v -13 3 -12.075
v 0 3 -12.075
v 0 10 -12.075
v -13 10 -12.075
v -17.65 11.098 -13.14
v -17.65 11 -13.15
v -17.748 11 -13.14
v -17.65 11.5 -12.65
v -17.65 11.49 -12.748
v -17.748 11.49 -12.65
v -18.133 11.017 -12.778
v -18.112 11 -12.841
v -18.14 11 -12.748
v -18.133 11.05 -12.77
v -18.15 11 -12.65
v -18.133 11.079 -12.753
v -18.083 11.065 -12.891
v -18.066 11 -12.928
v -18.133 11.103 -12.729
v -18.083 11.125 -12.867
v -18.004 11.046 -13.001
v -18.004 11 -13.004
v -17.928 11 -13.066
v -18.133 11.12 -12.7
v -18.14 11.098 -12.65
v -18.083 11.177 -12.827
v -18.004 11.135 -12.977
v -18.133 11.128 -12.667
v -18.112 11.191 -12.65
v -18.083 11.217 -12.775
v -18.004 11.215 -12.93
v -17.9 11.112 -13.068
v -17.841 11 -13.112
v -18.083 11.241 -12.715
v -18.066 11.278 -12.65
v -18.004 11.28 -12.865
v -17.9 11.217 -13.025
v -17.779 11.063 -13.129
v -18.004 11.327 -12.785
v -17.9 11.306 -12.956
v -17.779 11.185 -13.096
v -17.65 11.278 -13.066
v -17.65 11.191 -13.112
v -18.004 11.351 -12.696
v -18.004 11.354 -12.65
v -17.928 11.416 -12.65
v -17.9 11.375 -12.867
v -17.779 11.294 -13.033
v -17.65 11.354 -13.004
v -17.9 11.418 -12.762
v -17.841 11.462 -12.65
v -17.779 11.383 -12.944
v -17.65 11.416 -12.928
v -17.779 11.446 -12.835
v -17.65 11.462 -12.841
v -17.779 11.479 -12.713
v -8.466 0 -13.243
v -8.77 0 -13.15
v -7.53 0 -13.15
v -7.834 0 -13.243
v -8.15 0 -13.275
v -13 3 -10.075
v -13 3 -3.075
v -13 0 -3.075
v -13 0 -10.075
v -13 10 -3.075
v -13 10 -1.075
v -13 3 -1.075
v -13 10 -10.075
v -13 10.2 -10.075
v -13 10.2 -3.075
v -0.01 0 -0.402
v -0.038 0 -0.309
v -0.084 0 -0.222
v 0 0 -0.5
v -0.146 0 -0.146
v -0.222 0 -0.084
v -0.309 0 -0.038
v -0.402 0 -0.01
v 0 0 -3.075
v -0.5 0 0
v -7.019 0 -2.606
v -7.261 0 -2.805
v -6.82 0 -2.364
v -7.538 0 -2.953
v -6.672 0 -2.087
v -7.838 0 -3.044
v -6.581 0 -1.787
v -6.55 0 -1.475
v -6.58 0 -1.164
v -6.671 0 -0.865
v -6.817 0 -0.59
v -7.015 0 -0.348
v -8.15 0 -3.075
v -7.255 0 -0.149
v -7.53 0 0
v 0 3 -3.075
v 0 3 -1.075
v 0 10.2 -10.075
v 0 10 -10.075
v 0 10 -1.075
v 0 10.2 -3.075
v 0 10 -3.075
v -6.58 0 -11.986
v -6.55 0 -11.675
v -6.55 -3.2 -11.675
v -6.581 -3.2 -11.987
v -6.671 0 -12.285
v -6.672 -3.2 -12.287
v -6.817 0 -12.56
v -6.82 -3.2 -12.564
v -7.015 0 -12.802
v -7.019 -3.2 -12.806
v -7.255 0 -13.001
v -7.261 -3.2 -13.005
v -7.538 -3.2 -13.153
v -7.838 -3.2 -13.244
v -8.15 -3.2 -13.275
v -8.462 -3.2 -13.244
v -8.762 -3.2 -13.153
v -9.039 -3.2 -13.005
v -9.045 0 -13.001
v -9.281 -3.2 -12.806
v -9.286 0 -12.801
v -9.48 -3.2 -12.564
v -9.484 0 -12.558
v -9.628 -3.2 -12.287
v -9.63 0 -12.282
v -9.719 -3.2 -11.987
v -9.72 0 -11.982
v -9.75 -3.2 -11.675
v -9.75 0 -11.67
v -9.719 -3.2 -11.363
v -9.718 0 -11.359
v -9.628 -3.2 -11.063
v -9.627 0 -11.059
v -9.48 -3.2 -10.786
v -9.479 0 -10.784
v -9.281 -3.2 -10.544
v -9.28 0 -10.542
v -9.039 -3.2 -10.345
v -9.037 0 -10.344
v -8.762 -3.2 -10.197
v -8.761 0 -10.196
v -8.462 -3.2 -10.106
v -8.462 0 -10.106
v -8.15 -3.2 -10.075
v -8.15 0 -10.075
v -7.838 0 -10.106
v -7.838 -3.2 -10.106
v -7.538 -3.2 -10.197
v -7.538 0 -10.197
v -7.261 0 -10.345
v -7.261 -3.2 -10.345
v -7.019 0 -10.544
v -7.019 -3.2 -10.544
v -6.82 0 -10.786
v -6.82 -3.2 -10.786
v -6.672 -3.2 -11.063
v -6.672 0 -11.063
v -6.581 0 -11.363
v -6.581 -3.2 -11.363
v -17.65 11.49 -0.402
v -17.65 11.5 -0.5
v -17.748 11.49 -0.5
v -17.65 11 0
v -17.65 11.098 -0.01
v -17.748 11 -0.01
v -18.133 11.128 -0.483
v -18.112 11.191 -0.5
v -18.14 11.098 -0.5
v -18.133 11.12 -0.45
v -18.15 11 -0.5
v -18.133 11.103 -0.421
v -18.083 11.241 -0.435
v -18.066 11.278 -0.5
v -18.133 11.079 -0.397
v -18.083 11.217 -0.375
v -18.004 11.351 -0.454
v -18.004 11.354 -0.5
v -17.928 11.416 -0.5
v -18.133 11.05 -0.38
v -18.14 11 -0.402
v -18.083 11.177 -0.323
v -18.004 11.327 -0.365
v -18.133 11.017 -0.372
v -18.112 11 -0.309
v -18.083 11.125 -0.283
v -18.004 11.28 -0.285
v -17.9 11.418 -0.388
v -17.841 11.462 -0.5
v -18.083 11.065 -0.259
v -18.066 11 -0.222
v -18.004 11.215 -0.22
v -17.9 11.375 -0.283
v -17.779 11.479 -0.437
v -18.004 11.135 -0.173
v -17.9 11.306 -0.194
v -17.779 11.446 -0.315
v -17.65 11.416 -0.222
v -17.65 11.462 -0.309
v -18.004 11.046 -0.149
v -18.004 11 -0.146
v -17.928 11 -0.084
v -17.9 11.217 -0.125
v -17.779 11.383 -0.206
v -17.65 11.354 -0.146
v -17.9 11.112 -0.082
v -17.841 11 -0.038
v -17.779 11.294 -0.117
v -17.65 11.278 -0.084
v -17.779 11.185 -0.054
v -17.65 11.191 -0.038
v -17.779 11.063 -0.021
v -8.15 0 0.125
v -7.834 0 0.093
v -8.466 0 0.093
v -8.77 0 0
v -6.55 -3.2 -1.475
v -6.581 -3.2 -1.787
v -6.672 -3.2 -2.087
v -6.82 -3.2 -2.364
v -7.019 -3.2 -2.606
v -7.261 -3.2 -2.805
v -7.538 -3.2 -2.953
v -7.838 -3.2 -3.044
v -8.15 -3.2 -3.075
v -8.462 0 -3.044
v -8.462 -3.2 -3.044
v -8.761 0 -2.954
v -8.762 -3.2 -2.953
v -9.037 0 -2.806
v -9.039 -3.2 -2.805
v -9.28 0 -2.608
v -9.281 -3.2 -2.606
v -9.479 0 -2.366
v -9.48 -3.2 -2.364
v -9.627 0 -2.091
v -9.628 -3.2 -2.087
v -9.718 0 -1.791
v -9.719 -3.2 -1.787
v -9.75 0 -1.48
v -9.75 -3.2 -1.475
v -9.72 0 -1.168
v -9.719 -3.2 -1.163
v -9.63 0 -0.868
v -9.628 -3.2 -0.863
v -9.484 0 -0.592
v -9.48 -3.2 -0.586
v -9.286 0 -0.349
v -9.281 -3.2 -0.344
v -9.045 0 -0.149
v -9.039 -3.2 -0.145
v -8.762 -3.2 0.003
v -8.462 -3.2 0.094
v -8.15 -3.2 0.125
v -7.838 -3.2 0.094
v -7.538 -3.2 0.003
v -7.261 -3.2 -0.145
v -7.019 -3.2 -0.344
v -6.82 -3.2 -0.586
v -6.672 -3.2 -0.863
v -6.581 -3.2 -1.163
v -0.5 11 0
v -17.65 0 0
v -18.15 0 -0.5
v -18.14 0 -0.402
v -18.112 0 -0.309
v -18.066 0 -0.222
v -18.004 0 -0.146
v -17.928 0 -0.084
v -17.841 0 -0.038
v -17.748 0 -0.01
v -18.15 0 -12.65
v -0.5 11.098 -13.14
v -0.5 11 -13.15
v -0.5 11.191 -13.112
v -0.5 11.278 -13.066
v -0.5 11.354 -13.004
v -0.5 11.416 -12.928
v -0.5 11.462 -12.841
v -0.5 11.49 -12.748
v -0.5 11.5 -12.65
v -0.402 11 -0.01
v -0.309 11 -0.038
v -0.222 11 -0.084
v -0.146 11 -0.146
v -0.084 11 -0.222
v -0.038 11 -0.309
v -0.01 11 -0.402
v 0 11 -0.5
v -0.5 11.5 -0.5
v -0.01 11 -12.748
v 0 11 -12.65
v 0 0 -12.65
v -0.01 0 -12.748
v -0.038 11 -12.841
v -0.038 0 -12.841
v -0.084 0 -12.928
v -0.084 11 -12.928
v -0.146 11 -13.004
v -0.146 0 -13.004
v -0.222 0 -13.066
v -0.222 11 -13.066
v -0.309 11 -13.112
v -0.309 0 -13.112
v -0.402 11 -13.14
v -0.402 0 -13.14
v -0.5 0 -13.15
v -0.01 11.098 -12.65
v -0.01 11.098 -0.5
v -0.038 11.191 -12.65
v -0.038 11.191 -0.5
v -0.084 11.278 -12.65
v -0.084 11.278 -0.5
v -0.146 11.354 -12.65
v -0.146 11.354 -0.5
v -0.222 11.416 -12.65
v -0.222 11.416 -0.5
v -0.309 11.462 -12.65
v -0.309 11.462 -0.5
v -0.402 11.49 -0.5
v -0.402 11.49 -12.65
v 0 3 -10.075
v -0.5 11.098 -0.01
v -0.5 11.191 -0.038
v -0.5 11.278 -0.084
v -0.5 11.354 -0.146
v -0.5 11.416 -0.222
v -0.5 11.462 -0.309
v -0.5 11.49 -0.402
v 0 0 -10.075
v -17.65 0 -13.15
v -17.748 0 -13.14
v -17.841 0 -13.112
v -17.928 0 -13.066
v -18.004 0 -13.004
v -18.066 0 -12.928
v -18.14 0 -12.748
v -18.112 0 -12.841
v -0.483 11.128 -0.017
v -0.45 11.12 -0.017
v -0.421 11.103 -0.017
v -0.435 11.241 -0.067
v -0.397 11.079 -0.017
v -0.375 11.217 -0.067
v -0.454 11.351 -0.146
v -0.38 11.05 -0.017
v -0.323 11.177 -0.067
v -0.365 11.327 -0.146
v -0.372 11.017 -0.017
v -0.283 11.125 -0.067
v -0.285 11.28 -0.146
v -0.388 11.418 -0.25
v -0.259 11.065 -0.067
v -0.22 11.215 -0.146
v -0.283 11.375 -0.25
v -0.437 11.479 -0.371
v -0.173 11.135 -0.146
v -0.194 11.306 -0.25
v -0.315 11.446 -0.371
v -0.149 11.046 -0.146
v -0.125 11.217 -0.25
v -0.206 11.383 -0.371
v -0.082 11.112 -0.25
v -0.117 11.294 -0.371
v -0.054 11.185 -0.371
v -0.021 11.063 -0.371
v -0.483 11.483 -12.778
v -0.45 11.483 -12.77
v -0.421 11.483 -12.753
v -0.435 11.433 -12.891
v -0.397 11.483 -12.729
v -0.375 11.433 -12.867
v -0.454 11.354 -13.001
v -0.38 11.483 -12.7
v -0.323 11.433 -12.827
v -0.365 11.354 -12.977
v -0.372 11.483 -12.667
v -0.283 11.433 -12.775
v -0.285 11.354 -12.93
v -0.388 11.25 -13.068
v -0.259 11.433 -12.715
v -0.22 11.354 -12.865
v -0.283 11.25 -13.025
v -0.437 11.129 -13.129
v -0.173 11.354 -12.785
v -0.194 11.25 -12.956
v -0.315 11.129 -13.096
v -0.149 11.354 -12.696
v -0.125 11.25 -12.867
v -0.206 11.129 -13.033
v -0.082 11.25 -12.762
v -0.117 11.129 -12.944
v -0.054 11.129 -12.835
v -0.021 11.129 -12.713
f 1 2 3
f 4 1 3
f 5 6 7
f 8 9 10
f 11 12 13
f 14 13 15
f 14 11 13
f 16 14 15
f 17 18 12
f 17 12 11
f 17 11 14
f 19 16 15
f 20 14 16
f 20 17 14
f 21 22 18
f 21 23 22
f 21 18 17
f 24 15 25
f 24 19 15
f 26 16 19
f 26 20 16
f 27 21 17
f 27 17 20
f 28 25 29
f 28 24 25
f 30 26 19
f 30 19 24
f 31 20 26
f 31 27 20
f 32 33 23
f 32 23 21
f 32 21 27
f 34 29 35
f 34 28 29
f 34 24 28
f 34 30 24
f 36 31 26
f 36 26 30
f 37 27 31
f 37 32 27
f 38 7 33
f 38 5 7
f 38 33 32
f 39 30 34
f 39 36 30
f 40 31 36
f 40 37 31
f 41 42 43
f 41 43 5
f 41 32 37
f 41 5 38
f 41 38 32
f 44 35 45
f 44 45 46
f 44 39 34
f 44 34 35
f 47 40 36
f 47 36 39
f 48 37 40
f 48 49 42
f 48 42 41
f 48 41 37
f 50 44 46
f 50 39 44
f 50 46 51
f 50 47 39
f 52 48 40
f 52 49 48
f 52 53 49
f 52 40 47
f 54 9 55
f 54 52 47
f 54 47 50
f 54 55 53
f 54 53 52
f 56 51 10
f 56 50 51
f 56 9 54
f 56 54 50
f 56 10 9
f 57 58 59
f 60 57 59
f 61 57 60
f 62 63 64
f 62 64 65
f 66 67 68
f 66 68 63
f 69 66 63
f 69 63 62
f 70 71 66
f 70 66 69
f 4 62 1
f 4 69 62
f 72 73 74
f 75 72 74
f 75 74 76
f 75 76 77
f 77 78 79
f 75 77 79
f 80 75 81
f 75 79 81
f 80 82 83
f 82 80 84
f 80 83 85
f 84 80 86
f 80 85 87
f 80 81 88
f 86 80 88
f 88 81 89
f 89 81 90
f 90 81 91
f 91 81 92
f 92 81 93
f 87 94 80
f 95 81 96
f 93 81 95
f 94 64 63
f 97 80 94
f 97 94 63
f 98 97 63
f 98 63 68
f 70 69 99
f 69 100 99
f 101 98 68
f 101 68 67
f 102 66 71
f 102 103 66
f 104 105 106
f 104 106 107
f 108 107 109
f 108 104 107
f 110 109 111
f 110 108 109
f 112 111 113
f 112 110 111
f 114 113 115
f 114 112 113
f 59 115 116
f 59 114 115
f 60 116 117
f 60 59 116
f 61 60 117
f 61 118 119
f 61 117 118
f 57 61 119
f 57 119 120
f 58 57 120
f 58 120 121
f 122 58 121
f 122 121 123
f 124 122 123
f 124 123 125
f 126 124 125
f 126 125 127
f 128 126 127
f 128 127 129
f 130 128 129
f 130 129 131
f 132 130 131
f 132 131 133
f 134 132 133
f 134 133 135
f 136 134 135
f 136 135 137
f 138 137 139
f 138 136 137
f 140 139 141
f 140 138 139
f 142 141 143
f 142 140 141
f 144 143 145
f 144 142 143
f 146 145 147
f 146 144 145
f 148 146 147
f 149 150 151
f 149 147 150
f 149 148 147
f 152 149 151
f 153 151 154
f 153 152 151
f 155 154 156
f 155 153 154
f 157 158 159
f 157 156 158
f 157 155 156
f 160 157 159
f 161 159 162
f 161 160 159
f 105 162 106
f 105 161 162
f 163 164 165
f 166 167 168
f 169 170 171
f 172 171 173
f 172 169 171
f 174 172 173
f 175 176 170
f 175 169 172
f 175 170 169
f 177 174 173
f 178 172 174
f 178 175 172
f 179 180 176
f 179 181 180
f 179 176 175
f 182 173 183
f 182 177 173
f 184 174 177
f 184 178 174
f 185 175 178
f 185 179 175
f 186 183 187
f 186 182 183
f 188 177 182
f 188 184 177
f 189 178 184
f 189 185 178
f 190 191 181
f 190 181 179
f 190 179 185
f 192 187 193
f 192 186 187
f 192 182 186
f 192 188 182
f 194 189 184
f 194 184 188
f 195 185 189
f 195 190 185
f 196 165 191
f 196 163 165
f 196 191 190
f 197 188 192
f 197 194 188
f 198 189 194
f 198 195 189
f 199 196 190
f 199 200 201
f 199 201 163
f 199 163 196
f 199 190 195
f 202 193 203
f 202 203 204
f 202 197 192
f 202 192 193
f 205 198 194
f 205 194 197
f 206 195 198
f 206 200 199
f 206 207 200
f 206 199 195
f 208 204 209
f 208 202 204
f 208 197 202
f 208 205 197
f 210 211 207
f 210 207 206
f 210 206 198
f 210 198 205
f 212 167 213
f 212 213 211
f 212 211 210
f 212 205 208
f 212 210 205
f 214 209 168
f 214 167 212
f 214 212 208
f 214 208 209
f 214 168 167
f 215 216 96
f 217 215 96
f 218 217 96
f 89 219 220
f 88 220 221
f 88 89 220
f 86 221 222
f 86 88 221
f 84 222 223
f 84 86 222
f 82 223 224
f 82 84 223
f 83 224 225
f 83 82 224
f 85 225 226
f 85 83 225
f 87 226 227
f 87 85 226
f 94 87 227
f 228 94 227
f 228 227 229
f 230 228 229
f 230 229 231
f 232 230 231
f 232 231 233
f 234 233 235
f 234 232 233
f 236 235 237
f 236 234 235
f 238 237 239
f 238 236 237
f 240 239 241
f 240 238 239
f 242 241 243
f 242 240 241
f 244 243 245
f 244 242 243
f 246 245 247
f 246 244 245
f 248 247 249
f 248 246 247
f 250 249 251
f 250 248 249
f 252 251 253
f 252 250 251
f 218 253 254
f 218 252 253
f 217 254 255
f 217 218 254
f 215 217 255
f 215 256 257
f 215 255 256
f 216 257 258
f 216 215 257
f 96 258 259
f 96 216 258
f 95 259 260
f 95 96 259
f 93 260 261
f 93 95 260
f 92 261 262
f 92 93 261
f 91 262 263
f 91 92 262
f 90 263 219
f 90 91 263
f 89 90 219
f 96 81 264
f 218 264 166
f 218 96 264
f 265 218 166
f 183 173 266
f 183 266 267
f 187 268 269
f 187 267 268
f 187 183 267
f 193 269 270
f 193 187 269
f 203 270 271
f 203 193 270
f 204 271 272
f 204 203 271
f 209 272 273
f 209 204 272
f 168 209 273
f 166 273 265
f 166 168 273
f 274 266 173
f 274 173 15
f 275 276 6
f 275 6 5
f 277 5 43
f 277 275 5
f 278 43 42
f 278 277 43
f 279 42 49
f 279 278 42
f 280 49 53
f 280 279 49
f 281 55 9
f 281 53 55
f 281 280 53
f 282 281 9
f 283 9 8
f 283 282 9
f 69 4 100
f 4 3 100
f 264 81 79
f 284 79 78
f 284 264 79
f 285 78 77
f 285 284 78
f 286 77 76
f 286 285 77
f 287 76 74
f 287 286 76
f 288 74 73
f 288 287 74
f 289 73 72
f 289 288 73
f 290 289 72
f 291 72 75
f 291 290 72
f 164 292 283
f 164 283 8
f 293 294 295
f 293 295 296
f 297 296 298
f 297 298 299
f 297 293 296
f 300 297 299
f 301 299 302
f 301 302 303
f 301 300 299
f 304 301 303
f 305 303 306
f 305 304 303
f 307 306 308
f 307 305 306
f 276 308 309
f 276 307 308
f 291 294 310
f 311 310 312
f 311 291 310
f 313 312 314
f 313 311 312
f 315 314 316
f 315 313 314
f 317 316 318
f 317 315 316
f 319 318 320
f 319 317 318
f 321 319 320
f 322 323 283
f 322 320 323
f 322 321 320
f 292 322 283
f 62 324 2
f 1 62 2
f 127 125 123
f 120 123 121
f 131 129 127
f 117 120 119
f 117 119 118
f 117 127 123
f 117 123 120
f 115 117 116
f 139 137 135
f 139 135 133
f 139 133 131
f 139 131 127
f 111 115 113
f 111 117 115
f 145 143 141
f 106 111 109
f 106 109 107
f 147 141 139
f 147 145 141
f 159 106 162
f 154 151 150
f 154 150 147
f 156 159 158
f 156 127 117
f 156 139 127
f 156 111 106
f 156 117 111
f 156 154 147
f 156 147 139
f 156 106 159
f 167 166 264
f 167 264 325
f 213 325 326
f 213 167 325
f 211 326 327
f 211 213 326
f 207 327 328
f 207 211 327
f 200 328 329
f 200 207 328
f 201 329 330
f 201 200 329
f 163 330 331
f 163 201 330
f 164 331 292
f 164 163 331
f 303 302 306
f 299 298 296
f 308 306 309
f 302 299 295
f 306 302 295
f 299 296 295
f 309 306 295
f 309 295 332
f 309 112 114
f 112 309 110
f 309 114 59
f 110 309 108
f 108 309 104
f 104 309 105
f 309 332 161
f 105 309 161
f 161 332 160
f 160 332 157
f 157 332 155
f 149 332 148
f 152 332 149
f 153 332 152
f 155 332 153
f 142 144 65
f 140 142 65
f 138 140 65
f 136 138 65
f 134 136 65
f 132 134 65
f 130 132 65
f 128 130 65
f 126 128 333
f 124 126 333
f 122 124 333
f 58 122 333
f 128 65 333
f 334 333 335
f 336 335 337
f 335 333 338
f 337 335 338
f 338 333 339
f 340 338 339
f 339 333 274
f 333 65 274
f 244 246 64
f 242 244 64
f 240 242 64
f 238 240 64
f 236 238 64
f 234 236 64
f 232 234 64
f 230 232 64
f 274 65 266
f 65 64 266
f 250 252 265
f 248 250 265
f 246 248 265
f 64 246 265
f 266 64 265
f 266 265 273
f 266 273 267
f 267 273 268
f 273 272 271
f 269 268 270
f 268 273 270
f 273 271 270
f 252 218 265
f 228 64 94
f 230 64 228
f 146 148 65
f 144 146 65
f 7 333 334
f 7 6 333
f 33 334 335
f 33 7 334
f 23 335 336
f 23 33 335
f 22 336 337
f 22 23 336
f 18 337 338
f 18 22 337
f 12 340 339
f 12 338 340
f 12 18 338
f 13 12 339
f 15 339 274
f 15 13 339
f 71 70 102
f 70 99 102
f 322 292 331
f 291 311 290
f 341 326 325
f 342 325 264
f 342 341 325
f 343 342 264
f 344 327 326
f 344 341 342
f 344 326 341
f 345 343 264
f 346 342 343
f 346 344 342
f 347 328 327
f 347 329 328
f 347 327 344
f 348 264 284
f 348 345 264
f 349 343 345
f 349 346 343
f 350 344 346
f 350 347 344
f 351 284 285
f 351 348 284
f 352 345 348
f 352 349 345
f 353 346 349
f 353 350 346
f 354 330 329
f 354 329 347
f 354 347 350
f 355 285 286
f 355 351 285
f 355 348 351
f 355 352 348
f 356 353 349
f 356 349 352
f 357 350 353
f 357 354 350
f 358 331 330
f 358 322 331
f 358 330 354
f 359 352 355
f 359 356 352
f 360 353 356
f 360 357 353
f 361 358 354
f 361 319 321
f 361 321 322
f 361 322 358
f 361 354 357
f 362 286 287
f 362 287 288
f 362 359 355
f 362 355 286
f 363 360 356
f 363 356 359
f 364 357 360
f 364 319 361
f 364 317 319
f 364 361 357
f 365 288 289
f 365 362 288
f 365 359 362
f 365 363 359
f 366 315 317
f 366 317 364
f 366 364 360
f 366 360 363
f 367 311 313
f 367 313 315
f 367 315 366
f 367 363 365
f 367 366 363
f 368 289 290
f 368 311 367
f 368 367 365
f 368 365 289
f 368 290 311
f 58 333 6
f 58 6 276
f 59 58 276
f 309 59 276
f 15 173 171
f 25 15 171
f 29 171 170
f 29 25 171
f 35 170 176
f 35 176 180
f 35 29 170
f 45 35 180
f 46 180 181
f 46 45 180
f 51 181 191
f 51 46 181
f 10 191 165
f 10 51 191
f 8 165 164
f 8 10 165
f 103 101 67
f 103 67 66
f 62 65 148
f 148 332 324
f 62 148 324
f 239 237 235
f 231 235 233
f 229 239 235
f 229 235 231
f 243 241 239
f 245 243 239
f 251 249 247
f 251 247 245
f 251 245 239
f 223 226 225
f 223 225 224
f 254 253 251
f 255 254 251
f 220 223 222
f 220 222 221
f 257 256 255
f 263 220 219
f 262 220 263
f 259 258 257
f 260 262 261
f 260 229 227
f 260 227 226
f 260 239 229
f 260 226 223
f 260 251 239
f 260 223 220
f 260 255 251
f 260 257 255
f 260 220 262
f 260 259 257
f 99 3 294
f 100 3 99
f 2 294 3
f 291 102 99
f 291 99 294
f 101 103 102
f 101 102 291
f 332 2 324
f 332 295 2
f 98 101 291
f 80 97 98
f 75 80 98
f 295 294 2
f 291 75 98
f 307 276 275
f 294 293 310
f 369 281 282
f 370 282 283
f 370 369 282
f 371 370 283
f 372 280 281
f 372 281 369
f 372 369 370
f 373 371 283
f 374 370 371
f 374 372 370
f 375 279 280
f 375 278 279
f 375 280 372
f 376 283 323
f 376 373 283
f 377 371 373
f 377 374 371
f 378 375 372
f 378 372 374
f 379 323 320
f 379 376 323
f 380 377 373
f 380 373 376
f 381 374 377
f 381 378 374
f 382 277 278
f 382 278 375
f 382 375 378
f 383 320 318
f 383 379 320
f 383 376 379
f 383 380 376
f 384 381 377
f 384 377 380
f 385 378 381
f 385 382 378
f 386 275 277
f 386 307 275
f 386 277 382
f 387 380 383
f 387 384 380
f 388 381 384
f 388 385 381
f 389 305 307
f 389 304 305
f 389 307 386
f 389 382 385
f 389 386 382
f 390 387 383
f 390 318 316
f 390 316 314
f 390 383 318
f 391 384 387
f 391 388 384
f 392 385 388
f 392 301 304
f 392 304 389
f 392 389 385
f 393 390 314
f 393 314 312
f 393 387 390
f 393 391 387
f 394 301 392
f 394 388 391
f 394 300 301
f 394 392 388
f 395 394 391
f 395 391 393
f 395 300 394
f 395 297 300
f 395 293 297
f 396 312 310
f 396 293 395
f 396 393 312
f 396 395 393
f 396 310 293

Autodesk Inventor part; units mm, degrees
ref_plane "YZ Plane" through (0, 0, 0) normal (1, 0, 0) x (0, 1, 0)
ref_plane "XZ Plane" through (0, 0, 0) normal (0, 1, 0) x (-1, 0, 0)
ref_plane "XY Plane" through (0, 0, 0) normal (0, 0, 1) x (1, 0, 0)
sketch "Sketch1" plane through (0, 0, 0) normal (0, 1, 0) x (-1, 0, 0)
  line L0 (0, 0) -> (18.15, 0)
  line L1 (18.15, 0) -> (18.15, -13.15)
  line L2 (18.15, -13.15) -> (0, -13.15)
  line L3 (0, -13.15) -> (0, 0)
  dimension "d0" = 18.15
  dimension "d1" = 13.15
extrude "Extrusion1" add sketch "Sketch1" along normal blind 11.5
sketch "Sketch2" plane through (0, 0, 0) normal (0, -1, 0) x (1, 0, 0)
  circle A0 centre (-8.15, -1.475) radius 1.6
  line L0 (0, 0) -> (0, -13.15) projected
  line L1 (-18.15, -13.15) -> (-18.15, 0) projected
  line L2 (0, 0) -> (0, -13.15) projected
  line L3 (0, -6.575) -> (-18.15, -6.575) construction
  circle A1 centre (-8.15, -11.675) radius 1.6
  dimension "d5" = 10
  dimension "d6" = 3.2
  dimension "d7" = 5.1
extrude "Extrusion2" add sketch "Sketch2" along normal blind 3.2
sketch "Sketch3" plane through (0, 0, 0) normal (1, 0, 0) x (0, 0, -1)
  line L0 (0, 0) -> (13.15, 0) projected
  line L1 (6.575, 0) -> (6.575, 11.5) construction
  line L2 (13.15, 11.5) -> (0, 11.5) projected
  line L3 (3.075, 0) -> (3.075, 3)
  line L4 (3.075, 3) -> (1.075, 3)
  line L5 (1.075, 3) -> (1.075, 10)
  line L6 (1.075, 10) -> (3.075, 10)
  line L7 (3.075, 10) -> (3.075, 10.2)
  line L8 (3.075, 10.2) -> (6.575, 10.2)
  line L9 (3.075, 0) -> (6.575, 0)
  line L10 (10.075, 0) -> (10.075, 3)
  line L11 (10.075, 3) -> (12.075, 3)
  line L12 (12.075, 3) -> (12.075, 10)
  line L13 (12.075, 10) -> (10.075, 10)
  line L14 (10.075, 10) -> (10.075, 10.2)
  line L15 (10.075, 10.2) -> (6.575, 10.2)
  line L16 (10.075, 0) -> (6.575, 0)
  dimension "d10" = 3.5
  dimension "d11" = 3
  dimension "d12" = 7
  dimension "d13" = 2
  dimension "d15" = 1.3
extrude "Extrusion3" cut sketch "Sketch3" against normal blind 13
fillet "Fillet1" radius 0.5 8 edges at (0, 5.75, -13.15) (-9.075, 11.5, -13.15) (0, 11.5, -6.575) (0, 5.75, 0) (-9.075, 11.5, 0) (-18.15, 5.75, 0) (-18.15, 11.5, -6.575) (-18.15, 5.75, -13.15)
properties part number "RJ12 Connector"
